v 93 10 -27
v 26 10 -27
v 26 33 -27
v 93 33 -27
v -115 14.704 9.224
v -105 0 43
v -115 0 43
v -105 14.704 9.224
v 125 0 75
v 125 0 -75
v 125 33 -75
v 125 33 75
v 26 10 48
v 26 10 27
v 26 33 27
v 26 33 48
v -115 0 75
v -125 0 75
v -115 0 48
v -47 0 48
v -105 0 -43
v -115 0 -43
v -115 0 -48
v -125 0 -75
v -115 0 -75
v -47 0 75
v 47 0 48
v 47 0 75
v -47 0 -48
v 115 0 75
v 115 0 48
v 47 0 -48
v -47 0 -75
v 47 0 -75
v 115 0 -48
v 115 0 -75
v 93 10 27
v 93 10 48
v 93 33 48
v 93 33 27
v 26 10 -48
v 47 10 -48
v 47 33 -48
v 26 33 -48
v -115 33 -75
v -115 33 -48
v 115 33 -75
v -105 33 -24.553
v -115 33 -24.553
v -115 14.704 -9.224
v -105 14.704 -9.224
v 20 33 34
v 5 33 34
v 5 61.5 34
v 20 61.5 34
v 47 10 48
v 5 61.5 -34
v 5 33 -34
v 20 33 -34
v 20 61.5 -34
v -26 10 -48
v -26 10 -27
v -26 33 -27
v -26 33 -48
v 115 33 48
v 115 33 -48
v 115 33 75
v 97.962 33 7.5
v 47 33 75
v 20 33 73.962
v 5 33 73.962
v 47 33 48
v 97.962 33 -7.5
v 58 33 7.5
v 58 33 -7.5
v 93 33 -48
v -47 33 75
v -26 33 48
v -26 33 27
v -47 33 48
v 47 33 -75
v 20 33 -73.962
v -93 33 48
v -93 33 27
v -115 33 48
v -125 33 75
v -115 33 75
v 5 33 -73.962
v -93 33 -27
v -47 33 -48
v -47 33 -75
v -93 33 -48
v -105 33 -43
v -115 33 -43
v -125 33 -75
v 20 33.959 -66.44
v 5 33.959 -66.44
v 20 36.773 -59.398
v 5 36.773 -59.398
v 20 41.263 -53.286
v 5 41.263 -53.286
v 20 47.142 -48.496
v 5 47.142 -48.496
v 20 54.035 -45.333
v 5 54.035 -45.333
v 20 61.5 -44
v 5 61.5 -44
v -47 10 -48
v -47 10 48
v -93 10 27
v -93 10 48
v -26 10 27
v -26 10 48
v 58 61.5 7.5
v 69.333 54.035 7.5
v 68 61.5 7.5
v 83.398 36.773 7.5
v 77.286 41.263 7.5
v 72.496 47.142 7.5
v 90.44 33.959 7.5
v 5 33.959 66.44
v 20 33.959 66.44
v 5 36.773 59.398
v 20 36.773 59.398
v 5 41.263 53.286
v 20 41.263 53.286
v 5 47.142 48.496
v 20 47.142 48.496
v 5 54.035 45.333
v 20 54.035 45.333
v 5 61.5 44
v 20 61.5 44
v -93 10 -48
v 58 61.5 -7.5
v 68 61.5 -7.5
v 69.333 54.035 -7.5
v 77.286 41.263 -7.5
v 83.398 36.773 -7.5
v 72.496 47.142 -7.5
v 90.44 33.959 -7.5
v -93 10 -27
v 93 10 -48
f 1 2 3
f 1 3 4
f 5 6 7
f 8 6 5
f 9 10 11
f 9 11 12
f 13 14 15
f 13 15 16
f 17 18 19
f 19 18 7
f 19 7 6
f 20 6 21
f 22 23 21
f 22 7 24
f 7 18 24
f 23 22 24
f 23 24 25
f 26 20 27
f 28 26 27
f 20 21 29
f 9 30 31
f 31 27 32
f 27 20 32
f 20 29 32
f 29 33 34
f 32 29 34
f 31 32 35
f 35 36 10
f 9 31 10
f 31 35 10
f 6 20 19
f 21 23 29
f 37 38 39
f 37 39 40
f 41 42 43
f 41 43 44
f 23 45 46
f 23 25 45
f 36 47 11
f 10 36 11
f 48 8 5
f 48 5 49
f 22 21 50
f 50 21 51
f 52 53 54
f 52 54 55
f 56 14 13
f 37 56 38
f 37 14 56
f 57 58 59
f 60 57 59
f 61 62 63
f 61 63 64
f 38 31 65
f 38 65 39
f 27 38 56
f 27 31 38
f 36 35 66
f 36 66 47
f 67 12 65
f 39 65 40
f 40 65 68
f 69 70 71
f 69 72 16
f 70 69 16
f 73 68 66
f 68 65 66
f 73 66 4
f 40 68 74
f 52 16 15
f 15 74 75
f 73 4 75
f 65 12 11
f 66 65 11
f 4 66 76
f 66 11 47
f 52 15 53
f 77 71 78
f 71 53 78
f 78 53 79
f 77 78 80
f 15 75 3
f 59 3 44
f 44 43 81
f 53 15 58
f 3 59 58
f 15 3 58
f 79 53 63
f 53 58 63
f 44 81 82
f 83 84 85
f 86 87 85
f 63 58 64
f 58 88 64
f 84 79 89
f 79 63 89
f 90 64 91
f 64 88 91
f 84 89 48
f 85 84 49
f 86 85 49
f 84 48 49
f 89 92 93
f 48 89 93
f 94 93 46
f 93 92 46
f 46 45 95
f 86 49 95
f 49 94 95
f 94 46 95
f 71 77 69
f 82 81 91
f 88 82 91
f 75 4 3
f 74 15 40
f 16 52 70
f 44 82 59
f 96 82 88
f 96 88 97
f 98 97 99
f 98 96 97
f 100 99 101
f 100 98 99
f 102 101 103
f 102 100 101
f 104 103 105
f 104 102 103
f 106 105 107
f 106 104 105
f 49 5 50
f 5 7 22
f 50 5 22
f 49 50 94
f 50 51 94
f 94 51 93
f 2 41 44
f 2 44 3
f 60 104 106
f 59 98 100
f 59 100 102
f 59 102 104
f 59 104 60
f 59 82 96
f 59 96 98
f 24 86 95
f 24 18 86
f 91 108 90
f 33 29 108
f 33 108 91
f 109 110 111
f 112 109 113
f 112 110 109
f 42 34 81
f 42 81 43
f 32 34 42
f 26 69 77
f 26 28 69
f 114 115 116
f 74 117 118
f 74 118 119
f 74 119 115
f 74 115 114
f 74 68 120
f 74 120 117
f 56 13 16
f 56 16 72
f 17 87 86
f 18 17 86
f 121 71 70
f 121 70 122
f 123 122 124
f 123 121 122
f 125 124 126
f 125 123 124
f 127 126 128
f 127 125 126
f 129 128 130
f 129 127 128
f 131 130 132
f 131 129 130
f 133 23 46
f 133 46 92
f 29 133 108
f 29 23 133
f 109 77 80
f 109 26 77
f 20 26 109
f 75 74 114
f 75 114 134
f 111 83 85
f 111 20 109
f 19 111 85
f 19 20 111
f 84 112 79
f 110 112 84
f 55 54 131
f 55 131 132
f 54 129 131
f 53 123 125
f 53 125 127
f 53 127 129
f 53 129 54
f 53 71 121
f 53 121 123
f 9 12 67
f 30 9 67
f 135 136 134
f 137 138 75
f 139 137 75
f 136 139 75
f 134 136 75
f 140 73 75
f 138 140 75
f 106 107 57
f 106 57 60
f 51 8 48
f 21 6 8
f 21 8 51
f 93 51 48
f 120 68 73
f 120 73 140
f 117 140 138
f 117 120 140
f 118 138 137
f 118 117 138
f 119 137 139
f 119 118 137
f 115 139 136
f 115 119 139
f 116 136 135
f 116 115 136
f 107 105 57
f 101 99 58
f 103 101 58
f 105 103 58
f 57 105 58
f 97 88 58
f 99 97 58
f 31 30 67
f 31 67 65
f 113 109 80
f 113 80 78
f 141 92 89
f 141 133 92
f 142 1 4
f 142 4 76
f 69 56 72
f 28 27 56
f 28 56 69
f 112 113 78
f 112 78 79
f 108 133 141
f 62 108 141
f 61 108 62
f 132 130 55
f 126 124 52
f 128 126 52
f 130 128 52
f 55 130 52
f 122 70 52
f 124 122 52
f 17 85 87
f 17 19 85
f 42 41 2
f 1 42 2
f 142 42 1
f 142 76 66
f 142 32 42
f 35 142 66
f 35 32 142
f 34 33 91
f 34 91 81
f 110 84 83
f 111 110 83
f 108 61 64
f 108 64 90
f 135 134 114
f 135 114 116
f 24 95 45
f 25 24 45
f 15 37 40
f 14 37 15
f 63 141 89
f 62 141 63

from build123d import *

# Parameters (mm, degrees)
SKETCH2_W                = 10
SKETCH2_H                = 86
BOSS_EXTRUDE1_DEPTH      = 10
SKETCH3_W                = 10
SKETCH3_H                = 86
BOSS_EXTRUDE2_DEPTH      = 23
BOSS_EXTRUDE3_REACH      = 246.16
BOSS_EXTRUDE4_DEPTH      = 100
BOSS_EXTRUDE4_DEPTH_BACK = 5
SKETCH5_R                = 47.55
SKETCH7_W                = 10
SKETCH7_H                = 18.447060317
BOSS_EXTRUDE6_DEPTH      = 30
CUT_EXTRUDE2_DEPTH       = 10
BOSS_EXTRUDE7_REACH      = 275.742
SKETCH6_R                = 45.55
CUT_EXTRUDE1_DEPTH       = 100
SKETCH10_W               = 15
SKETCH10_H               = 10
SKETCH10_W_2             = 10
SKETCH10_H_2             = 15
BOSS_EXTRUDE8_DEPTH      = 28.5
FILLET1_R                = 30
FILLET2_R                = 30
FILLET3_R                = 30
SKETCH11_W               = 111.971085125
SKETCH11_H               = 99.425275067
CUT_EXTRUDE3_DEPTH       = 234.52646531


with BuildPart() as part:
    # Sketch2 → Boss-Extrude1 (new body)
    with BuildSketch(Plane(origin=(0, 0, 0), x_dir=(1, 0, 0), z_dir=(0, 1, 0))):
        Polygon((-125, -75), (-115, -75), (-115, -48), (-47, -48), (-47, -75), (47, -75), (47, -48), (115, -48), (115, -75), (125, -75), (125, 75), (115, 75), (115, 48), (47, 48), (47, 75), (-47, 75), (-47, 48), (-115, 48), (-115, 75), (-125, 75), align=None)
        with Locations((-110, 0)):
            Rectangle(SKETCH2_W, SKETCH2_H, mode=Mode.SUBTRACT)
    extrude(amount=BOSS_EXTRUDE1_DEPTH)

    # Sketch3 → Boss-Extrude2 (add)
    with BuildSketch(Plane(origin=(0, 10, 0), x_dir=(1, 0, 0), z_dir=(0, 1, 0))):
        Polygon((-47, 48), (-47, 75), (47, 75), (47, 48), (26, 48), (26, 27), (93, 27), (93, 48), (115, 48), (115, 75), (125, 75), (125, -75), (115, -75), (115, -48), (93, -48), (93, -27), (26, -27), (26, -48), (47, -48), (47, -75), (-47, -75), (-47, -48), (-26, -48), (-26, -27), (-93, -27), (-93, -48), (-115, -48), (-115, -75), (-125, -75), (-125, 75), (-115, 75), (-115, 48), (-93, 48), (-93, 27), (-26, 27), (-26, 48), align=None)
        with Locations((-110, 0)):
            Rectangle(SKETCH3_W, SKETCH3_H, mode=Mode.SUBTRACT)
    extrude(amount=BOSS_EXTRUDE2_DEPTH)

    # Sketch4 → Boss-Extrude3 (add, up to next)
    with BuildSketch(Plane.ZY.offset(105), mode=Mode.PRIVATE) as boss_extrude3_sk1:
        Polygon((-43, 0), (-9.223530158, 14.703891082), (-43, 33), align=None)
    boss_extrude3_tool1 = extrude(boss_extrude3_sk1.sketch, amount=BOSS_EXTRUDE3_REACH, mode=Mode.PRIVATE) - part.part
    # Sketch4 → Boss-Extrude3 (add, up to next)
    with BuildSketch(Plane.ZY.offset(105), mode=Mode.PRIVATE) as boss_extrude3_sk2:
        Polygon((43, 0), (9.223530158, 14.703891082), (-24.552939683, 33), (43, 33), align=None)
    boss_extrude3_tool2 = extrude(boss_extrude3_sk2.sketch, amount=BOSS_EXTRUDE3_REACH, mode=Mode.PRIVATE) - part.part
    add(boss_extrude3_tool1.solids().sort_by_distance((-105, 15.901297, -31.741177))[0])
    add(boss_extrude3_tool2.solids().sort_by_distance((-105, 21.685197, 19.901194))[0])



with BuildPart() as body_2:
    # Sketch5 → Boss-Extrude4 (new, two sides: drawn at the far end of the back side and taken through both)
    with BuildSketch(Plane(origin=(-115, 0, 0), x_dir=(0, 0, -1), z_dir=(1, 0, 0)).offset(-BOSS_EXTRUDE4_DEPTH_BACK)):
        with Locations((0, 80.55)):
            Circle(SKETCH5_R)
    extrude(amount=BOSS_EXTRUDE4_DEPTH + BOSS_EXTRUDE4_DEPTH_BACK)


with BuildPart() as part_1:
    add(part.part)

    add(body_2.part)  # Boss-Extrude6 merges body 2
    # Sketch7 → Boss-Extrude6 (add)
    with BuildSketch(Plane(origin=(0, 33, 0), x_dir=(1, 0, 0), z_dir=(0, 1, 0))):
        Polygon((-120, 0), (-120, 48), (-93, 48), (-93, 27), (-15, 27), (-15, -27), (-93, -27), (-93, -48), (-120, -48), align=None)
        with Locations((-110, 33.776469842)):
            Rectangle(SKETCH7_W, SKETCH7_H, mode=Mode.SUBTRACT)
    extrude(amount=BOSS_EXTRUDE6_DEPTH)

    # Sketch8 → Cut-Extrude2 (cut)
    with BuildSketch(Plane.ZY.offset(105)):
        Polygon((-43, 46.626077643), (-41.871641374, 62.212018017), (-24.552939683, 62.212018017), (-24.552939683, 33), (-43, 33), align=None)
    extrude(amount=CUT_EXTRUDE2_DEPTH, mode=Mode.SUBTRACT)

    # Sketch9 → Boss-Extrude7 (add, up to next)
    with BuildSketch(Plane.ZY.offset(105), mode=Mode.PRIVATE) as boss_extrude7_sk1:
        Polygon((-42.138917347, 58.520153318), (-43, 46.626077643), (-43, 62.212018017), (-41.871641374, 62.212018017), align=None)
    boss_extrude7_tool1 = extrude(boss_extrude7_sk1.sketch, amount=BOSS_EXTRUDE7_REACH, mode=Mode.PRIVATE) - part_1.part
    add(boss_extrude7_tool1.solids().sort_by_distance((-105, 57.016705, -42.62388))[0])

    # Sketch6 → Cut-Extrude1 (cut)
    with BuildSketch(Plane(origin=(-15, 0, 0), x_dir=(0, 0, -1), z_dir=(1, 0, 0))):
        with Locations((0, 80.55)):
            Circle(SKETCH6_R)
    extrude(amount=-CUT_EXTRUDE1_DEPTH, mode=Mode.SUBTRACT)

    # Sketch10 → Boss-Extrude8 (add)
    with BuildSketch(Plane(origin=(0, 33, 0), x_dir=(1, 0, 0), z_dir=(0, 1, 0))):
        with Locations((12.5, 39)):
            Rectangle(SKETCH10_W, SKETCH10_H)
        with Locations((12.5, -39)):
            Rectangle(SKETCH10_W, SKETCH10_H)
        with Locations((63, 0)):
            Rectangle(SKETCH10_W_2, SKETCH10_H_2)
    extrude(amount=BOSS_EXTRUDE8_DEPTH)

    # Fillet1
    # the kernel refuses this fillet: 30 mm, written as the material it adds along each edge
    with BuildSketch(Plane(origin=(5, 33, 44), x_dir=(0, 0, 1), z_dir=(1, 0, 0))) as fillet1_piece_1:
        with BuildLine():
            CenterArc((29.962476533, -30), FILLET1_R, 90, 87.134016017)
            Line((0, -28.5), (0, 0))
            Line((0, 0), (29.962476533, 0))
        make_face()
    extrude(amount=15)

    # Fillet2
    # the kernel refuses this fillet: 30 mm, written as the material it adds along each edge
    with BuildSketch(Plane(origin=(20, 33, -44), x_dir=(0, 0, -1), z_dir=(-1, 0, 0))) as fillet2_piece_1:
        with BuildLine():
            CenterArc((29.962476533, -30), FILLET2_R, 90, 87.134016017)
            Line((0, -28.5), (0, 0))
            Line((0, 0), (29.962476533, 0))
        make_face()
    extrude(amount=15)

    # Fillet3
    # the kernel refuses this fillet: 30 mm, written as the material it adds along each edge
    with BuildSketch(Plane(origin=(68, 33, 7.5), x_dir=(1, 0, 0), z_dir=(0, 0, -1))) as fillet3_piece_1:
        with BuildLine():
            CenterArc((29.962476533, -30), FILLET3_R, 90, 87.134016017)
            Line((0, -28.5), (0, 0))
            Line((0, 0), (29.962476533, 0))
        make_face()
    extrude(amount=15)

    # Sketch11 → Cut-Extrude3 (cut, through all)
    with BuildSketch(Plane.XY.offset(75)):
        with Locations((-64.014457438, 82.712637534)):
            Rectangle(SKETCH11_W, SKETCH11_H)
    extrude(amount=-CUT_EXTRUDE3_DEPTH, mode=Mode.SUBTRACT)


solid = part_1.part
